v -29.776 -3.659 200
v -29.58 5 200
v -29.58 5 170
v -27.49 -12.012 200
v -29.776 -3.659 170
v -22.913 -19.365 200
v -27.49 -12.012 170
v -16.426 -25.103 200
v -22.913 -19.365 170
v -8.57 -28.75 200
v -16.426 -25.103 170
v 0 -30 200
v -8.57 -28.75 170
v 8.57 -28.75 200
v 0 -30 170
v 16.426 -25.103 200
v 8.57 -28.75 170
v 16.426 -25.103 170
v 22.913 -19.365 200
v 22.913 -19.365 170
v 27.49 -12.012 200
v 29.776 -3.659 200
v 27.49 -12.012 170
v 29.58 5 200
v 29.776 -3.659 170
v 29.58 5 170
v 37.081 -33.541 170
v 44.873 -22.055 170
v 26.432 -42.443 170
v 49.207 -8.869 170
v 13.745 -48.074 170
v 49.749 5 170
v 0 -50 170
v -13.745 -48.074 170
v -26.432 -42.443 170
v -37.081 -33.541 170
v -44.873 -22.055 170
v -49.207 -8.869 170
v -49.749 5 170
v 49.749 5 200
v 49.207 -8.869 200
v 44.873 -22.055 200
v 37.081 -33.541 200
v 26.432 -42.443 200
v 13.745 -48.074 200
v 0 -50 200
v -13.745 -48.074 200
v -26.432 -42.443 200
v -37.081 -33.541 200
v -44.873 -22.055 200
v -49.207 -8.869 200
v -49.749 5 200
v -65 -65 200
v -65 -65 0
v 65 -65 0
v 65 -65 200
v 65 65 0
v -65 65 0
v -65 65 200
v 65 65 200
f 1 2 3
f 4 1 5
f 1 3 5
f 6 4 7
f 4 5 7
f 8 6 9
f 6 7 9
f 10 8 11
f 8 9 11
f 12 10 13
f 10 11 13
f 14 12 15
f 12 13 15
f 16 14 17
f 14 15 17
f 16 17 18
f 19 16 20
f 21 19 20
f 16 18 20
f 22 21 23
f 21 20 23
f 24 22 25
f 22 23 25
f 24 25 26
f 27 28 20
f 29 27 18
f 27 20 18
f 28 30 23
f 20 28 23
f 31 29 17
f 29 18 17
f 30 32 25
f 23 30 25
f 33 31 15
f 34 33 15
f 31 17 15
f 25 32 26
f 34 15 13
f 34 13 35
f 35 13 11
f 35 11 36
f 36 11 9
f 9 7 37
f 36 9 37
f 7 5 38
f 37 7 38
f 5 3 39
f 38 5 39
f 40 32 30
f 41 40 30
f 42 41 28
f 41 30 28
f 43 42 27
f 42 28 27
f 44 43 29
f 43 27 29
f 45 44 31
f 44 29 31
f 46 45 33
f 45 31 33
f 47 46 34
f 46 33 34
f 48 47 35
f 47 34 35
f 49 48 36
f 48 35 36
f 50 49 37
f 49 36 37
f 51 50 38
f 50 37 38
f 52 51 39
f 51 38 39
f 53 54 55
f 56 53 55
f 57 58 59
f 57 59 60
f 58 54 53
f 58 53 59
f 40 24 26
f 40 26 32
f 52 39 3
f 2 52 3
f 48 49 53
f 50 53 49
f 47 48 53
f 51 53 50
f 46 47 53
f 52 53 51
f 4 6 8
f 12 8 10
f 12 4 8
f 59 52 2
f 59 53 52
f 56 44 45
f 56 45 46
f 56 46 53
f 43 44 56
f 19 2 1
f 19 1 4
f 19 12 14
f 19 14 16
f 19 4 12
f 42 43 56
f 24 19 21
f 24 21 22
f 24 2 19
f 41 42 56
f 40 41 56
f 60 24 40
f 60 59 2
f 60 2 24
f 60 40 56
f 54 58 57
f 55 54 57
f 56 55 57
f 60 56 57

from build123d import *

# Parameters (mm, degrees)
SKETCH_4_W      = 130
SKETCH_4_H      = 130
EXTRUDE_1_DEPTH = 200
SKETCH_5_W      = 130
SKETCH_5_H      = 130
EXTRUDE_2_DEPTH = 170


with BuildPart() as part:
    # 스케치4 → 보스-돌출1 (new body)
    with BuildSketch(Plane.XY):
        Rectangle(SKETCH_4_W, SKETCH_4_H)
        with BuildLine():
            Line((-49.749371855, 5), (-29.580398915, 5))
            ThreePointArc((-29.580398915, 5), (0, -30), (29.580398915, 5))
            Line((29.580398915, 5), (49.749371855, 5))
            ThreePointArc((49.749371855, 5), (0, -50), (-49.749371855, 5))
        make_face(mode=Mode.SUBTRACT)
    extrude(amount=EXTRUDE_1_DEPTH)

    # 스케치5 → 보스-돌출2 (add)
    with BuildSketch(Plane(origin=(0, 0, 0), x_dir=(-1, 0, 0), z_dir=(0, 0, -1))):
        Rectangle(SKETCH_5_W, SKETCH_5_H)
    extrude(amount=-EXTRUDE_2_DEPTH)


solid = part.part
